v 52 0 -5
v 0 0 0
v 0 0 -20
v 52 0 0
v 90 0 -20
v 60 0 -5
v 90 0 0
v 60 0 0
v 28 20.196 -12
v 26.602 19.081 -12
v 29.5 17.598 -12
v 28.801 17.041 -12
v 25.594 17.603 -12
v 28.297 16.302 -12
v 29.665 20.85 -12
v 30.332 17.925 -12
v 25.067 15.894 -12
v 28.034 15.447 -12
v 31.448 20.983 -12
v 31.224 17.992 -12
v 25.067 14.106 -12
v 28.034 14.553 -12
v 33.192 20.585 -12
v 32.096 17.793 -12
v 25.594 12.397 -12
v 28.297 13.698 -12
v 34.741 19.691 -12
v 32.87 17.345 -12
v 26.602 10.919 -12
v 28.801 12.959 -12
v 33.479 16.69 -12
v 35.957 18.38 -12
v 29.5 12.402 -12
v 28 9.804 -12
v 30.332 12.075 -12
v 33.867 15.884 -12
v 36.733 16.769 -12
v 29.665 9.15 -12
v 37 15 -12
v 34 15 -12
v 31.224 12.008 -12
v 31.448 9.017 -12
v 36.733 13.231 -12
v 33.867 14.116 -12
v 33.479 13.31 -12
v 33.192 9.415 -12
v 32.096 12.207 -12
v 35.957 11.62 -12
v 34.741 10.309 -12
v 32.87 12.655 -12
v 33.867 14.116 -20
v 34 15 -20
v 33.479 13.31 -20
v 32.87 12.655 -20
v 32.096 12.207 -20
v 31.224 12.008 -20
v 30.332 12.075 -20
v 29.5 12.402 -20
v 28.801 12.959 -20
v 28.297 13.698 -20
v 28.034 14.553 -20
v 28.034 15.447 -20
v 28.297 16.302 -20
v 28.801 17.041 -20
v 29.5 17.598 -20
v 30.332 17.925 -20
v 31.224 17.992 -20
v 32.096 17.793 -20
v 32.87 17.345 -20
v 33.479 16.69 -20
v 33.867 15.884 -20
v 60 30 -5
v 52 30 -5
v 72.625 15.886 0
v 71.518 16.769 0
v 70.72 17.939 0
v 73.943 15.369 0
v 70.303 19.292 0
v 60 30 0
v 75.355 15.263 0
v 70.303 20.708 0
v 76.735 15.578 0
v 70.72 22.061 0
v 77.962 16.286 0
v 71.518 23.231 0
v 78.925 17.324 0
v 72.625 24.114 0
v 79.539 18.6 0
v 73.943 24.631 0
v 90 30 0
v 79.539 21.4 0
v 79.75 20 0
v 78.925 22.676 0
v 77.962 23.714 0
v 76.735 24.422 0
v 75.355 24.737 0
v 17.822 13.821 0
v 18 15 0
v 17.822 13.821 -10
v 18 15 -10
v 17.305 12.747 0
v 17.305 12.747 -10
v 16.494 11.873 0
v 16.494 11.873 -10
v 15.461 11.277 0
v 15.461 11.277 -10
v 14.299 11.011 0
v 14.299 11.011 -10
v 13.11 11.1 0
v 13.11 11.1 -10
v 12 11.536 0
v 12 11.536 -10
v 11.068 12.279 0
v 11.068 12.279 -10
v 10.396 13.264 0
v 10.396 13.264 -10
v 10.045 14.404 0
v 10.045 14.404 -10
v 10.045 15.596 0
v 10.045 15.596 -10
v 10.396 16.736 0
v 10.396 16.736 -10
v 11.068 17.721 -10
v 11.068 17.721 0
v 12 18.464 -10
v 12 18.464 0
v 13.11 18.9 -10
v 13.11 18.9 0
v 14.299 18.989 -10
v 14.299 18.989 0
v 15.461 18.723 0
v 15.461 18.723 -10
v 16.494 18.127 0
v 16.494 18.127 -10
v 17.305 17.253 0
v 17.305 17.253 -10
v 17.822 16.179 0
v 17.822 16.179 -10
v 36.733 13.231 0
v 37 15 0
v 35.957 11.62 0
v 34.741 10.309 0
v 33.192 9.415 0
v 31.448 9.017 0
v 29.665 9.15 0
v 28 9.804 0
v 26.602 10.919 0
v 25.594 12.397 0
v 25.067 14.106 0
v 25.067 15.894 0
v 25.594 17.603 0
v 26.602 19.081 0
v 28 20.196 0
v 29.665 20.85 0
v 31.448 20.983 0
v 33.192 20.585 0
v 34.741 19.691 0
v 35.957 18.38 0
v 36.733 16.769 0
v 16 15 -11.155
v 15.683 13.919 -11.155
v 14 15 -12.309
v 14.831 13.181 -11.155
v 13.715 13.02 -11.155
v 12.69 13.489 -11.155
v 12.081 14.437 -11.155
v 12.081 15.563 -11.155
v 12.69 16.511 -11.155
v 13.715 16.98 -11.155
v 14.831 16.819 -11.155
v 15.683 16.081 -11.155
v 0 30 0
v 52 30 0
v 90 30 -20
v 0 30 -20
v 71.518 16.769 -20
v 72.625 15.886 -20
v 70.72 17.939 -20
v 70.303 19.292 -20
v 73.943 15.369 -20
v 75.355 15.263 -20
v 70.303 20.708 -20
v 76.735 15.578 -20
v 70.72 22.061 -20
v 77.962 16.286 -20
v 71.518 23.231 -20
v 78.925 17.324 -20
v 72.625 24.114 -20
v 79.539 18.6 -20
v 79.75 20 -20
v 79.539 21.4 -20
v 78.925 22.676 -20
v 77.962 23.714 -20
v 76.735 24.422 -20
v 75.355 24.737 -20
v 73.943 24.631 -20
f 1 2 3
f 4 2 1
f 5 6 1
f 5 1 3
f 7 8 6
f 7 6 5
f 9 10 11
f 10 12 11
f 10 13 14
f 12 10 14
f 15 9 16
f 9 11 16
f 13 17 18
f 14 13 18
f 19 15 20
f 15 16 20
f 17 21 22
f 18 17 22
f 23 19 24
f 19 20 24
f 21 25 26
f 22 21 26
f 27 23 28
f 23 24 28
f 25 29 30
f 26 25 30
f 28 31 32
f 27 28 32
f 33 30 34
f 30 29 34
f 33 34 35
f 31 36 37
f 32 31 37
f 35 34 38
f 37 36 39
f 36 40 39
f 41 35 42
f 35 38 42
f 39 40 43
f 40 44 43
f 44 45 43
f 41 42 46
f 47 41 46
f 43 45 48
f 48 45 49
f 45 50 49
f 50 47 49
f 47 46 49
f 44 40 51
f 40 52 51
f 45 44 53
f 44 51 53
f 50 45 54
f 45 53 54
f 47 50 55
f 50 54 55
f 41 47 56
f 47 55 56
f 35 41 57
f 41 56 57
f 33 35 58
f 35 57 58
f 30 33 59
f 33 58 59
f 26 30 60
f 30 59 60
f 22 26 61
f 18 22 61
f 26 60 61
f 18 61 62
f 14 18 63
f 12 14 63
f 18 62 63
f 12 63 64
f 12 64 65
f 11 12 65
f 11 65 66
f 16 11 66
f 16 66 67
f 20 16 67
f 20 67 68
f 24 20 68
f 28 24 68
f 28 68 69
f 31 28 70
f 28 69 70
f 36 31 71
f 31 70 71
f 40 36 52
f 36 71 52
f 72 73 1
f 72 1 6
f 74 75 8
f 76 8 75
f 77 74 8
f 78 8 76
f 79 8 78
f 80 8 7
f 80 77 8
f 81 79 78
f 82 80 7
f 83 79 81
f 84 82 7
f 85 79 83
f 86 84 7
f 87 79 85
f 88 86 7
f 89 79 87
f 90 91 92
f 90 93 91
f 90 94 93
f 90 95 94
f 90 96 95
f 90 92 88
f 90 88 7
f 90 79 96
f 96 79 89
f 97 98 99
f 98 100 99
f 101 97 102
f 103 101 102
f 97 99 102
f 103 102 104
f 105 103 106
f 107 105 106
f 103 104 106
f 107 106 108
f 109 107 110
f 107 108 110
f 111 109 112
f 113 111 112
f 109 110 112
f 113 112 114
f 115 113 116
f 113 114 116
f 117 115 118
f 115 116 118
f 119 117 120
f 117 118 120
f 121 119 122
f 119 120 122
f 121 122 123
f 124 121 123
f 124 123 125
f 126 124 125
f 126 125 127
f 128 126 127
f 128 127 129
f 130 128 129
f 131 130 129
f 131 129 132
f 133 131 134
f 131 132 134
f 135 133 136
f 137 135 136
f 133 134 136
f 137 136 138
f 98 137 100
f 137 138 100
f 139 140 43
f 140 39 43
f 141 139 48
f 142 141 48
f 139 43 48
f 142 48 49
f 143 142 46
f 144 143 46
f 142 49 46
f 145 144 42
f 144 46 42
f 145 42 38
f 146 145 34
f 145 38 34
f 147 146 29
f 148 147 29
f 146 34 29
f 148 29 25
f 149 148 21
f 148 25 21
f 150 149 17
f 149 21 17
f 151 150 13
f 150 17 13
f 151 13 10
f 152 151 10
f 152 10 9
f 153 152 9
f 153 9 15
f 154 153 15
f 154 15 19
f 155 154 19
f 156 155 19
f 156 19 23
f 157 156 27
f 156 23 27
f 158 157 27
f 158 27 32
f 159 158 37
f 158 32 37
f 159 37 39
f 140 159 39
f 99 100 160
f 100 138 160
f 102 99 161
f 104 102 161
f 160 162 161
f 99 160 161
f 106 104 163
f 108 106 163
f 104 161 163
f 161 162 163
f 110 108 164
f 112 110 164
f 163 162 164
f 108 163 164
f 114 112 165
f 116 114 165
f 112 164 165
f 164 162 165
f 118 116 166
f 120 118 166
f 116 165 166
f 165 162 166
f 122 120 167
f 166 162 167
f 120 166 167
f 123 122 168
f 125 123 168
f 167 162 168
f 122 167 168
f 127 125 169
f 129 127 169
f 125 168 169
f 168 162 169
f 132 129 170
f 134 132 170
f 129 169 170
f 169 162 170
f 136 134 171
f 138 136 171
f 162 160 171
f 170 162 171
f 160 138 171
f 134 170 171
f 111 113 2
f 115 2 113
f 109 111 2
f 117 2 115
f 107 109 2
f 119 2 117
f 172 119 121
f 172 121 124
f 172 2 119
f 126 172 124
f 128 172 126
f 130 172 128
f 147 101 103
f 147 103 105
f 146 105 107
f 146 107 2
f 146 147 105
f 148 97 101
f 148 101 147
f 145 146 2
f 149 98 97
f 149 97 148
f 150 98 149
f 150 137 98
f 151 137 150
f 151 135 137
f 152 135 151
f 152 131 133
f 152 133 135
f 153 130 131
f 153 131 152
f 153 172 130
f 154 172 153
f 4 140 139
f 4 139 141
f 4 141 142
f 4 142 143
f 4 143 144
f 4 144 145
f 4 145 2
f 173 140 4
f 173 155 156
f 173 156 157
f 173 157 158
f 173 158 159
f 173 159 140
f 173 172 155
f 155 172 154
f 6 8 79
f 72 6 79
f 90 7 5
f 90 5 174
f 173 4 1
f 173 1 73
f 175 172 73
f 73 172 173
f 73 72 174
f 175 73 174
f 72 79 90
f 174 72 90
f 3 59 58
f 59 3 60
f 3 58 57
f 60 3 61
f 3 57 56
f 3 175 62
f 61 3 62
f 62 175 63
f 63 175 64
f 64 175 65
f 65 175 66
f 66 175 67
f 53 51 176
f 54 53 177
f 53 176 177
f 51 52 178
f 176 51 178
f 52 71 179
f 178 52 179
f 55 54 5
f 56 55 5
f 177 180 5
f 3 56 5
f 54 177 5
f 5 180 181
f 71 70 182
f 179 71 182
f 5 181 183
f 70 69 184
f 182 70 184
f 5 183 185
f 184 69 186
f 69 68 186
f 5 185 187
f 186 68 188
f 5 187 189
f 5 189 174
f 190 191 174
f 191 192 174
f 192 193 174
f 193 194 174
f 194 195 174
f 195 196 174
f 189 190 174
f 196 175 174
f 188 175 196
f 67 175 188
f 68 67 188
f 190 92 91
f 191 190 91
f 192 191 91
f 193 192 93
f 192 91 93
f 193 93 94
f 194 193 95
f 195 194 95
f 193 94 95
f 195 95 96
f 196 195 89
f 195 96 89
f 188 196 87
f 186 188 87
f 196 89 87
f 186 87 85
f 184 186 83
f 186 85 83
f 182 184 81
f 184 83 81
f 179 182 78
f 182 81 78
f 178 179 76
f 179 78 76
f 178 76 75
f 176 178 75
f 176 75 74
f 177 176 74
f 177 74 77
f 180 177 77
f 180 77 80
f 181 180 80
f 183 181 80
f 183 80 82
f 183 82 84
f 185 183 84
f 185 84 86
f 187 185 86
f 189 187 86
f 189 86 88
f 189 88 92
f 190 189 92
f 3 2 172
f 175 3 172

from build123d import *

# Parameters (mm, degrees)
SKETCH_1_W          = 90
SKETCH_1_H          = 30
EXTRUDE_1_DEPTH     = 20
SKETCH_2_W          = 8
SKETCH_2_H          = 30
CUT_EXTRUDE_1_DEPTH = 5
SKETCH_8_R          = 4.75
CUT_EXTRUDE_4_DEPTH = 97.953597148


with BuildPart() as part:
    # Эскиз1 → Бобышка-Вытянуть1 (new body)
    with BuildSketch(Plane.XY):
        with Locations((45, 15)):
            Rectangle(SKETCH_1_W, SKETCH_1_H)
    extrude(amount=-EXTRUDE_1_DEPTH)

    # Эскиз2 → Вырез-Вытянуть1 (cut)
    with BuildSketch(Plane.XY):
        with Locations((56, 15)):
            Rectangle(SKETCH_2_W, SKETCH_2_H)
    extrude(amount=-CUT_EXTRUDE_1_DEPTH, mode=Mode.SUBTRACT)

    # Эскиз8 → Вырез-Вытянуть4 (cut, through all)
    with BuildSketch(Plane.XY):
        with Locations((75, 20)):
            Circle(SKETCH_8_R)
    extrude(amount=-CUT_EXTRUDE_4_DEPTH, mode=Mode.SUBTRACT)

    # Эскиз5 → Вырез-Повернуть1 (revolve, cut)
    with BuildSketch(Plane(origin=(0, 15, 0), x_dir=(1, 0, 0), z_dir=(0, 1, 0))):
        Polygon((31, 0), (37, 0), (37, 12), (34, 12), (34, 20), (31, 20), align=None)
    revolve(axis=Axis((31, 15, 0), (0, 0, -1)), mode=Mode.SUBTRACT)

    # Эскиз6 → Вырез-Повернуть2 (revolve, cut)
    with BuildSketch(Plane(origin=(0, 15, 0), x_dir=(1, 0, 0), z_dir=(0, 1, 0))):
        Polygon((14, 0), (18, 0), (18, 10), (14, 12.309401077), align=None)
    revolve(axis=Axis((14, 15, 0), (0, 0, -1)), mode=Mode.SUBTRACT)


solid = part.part
